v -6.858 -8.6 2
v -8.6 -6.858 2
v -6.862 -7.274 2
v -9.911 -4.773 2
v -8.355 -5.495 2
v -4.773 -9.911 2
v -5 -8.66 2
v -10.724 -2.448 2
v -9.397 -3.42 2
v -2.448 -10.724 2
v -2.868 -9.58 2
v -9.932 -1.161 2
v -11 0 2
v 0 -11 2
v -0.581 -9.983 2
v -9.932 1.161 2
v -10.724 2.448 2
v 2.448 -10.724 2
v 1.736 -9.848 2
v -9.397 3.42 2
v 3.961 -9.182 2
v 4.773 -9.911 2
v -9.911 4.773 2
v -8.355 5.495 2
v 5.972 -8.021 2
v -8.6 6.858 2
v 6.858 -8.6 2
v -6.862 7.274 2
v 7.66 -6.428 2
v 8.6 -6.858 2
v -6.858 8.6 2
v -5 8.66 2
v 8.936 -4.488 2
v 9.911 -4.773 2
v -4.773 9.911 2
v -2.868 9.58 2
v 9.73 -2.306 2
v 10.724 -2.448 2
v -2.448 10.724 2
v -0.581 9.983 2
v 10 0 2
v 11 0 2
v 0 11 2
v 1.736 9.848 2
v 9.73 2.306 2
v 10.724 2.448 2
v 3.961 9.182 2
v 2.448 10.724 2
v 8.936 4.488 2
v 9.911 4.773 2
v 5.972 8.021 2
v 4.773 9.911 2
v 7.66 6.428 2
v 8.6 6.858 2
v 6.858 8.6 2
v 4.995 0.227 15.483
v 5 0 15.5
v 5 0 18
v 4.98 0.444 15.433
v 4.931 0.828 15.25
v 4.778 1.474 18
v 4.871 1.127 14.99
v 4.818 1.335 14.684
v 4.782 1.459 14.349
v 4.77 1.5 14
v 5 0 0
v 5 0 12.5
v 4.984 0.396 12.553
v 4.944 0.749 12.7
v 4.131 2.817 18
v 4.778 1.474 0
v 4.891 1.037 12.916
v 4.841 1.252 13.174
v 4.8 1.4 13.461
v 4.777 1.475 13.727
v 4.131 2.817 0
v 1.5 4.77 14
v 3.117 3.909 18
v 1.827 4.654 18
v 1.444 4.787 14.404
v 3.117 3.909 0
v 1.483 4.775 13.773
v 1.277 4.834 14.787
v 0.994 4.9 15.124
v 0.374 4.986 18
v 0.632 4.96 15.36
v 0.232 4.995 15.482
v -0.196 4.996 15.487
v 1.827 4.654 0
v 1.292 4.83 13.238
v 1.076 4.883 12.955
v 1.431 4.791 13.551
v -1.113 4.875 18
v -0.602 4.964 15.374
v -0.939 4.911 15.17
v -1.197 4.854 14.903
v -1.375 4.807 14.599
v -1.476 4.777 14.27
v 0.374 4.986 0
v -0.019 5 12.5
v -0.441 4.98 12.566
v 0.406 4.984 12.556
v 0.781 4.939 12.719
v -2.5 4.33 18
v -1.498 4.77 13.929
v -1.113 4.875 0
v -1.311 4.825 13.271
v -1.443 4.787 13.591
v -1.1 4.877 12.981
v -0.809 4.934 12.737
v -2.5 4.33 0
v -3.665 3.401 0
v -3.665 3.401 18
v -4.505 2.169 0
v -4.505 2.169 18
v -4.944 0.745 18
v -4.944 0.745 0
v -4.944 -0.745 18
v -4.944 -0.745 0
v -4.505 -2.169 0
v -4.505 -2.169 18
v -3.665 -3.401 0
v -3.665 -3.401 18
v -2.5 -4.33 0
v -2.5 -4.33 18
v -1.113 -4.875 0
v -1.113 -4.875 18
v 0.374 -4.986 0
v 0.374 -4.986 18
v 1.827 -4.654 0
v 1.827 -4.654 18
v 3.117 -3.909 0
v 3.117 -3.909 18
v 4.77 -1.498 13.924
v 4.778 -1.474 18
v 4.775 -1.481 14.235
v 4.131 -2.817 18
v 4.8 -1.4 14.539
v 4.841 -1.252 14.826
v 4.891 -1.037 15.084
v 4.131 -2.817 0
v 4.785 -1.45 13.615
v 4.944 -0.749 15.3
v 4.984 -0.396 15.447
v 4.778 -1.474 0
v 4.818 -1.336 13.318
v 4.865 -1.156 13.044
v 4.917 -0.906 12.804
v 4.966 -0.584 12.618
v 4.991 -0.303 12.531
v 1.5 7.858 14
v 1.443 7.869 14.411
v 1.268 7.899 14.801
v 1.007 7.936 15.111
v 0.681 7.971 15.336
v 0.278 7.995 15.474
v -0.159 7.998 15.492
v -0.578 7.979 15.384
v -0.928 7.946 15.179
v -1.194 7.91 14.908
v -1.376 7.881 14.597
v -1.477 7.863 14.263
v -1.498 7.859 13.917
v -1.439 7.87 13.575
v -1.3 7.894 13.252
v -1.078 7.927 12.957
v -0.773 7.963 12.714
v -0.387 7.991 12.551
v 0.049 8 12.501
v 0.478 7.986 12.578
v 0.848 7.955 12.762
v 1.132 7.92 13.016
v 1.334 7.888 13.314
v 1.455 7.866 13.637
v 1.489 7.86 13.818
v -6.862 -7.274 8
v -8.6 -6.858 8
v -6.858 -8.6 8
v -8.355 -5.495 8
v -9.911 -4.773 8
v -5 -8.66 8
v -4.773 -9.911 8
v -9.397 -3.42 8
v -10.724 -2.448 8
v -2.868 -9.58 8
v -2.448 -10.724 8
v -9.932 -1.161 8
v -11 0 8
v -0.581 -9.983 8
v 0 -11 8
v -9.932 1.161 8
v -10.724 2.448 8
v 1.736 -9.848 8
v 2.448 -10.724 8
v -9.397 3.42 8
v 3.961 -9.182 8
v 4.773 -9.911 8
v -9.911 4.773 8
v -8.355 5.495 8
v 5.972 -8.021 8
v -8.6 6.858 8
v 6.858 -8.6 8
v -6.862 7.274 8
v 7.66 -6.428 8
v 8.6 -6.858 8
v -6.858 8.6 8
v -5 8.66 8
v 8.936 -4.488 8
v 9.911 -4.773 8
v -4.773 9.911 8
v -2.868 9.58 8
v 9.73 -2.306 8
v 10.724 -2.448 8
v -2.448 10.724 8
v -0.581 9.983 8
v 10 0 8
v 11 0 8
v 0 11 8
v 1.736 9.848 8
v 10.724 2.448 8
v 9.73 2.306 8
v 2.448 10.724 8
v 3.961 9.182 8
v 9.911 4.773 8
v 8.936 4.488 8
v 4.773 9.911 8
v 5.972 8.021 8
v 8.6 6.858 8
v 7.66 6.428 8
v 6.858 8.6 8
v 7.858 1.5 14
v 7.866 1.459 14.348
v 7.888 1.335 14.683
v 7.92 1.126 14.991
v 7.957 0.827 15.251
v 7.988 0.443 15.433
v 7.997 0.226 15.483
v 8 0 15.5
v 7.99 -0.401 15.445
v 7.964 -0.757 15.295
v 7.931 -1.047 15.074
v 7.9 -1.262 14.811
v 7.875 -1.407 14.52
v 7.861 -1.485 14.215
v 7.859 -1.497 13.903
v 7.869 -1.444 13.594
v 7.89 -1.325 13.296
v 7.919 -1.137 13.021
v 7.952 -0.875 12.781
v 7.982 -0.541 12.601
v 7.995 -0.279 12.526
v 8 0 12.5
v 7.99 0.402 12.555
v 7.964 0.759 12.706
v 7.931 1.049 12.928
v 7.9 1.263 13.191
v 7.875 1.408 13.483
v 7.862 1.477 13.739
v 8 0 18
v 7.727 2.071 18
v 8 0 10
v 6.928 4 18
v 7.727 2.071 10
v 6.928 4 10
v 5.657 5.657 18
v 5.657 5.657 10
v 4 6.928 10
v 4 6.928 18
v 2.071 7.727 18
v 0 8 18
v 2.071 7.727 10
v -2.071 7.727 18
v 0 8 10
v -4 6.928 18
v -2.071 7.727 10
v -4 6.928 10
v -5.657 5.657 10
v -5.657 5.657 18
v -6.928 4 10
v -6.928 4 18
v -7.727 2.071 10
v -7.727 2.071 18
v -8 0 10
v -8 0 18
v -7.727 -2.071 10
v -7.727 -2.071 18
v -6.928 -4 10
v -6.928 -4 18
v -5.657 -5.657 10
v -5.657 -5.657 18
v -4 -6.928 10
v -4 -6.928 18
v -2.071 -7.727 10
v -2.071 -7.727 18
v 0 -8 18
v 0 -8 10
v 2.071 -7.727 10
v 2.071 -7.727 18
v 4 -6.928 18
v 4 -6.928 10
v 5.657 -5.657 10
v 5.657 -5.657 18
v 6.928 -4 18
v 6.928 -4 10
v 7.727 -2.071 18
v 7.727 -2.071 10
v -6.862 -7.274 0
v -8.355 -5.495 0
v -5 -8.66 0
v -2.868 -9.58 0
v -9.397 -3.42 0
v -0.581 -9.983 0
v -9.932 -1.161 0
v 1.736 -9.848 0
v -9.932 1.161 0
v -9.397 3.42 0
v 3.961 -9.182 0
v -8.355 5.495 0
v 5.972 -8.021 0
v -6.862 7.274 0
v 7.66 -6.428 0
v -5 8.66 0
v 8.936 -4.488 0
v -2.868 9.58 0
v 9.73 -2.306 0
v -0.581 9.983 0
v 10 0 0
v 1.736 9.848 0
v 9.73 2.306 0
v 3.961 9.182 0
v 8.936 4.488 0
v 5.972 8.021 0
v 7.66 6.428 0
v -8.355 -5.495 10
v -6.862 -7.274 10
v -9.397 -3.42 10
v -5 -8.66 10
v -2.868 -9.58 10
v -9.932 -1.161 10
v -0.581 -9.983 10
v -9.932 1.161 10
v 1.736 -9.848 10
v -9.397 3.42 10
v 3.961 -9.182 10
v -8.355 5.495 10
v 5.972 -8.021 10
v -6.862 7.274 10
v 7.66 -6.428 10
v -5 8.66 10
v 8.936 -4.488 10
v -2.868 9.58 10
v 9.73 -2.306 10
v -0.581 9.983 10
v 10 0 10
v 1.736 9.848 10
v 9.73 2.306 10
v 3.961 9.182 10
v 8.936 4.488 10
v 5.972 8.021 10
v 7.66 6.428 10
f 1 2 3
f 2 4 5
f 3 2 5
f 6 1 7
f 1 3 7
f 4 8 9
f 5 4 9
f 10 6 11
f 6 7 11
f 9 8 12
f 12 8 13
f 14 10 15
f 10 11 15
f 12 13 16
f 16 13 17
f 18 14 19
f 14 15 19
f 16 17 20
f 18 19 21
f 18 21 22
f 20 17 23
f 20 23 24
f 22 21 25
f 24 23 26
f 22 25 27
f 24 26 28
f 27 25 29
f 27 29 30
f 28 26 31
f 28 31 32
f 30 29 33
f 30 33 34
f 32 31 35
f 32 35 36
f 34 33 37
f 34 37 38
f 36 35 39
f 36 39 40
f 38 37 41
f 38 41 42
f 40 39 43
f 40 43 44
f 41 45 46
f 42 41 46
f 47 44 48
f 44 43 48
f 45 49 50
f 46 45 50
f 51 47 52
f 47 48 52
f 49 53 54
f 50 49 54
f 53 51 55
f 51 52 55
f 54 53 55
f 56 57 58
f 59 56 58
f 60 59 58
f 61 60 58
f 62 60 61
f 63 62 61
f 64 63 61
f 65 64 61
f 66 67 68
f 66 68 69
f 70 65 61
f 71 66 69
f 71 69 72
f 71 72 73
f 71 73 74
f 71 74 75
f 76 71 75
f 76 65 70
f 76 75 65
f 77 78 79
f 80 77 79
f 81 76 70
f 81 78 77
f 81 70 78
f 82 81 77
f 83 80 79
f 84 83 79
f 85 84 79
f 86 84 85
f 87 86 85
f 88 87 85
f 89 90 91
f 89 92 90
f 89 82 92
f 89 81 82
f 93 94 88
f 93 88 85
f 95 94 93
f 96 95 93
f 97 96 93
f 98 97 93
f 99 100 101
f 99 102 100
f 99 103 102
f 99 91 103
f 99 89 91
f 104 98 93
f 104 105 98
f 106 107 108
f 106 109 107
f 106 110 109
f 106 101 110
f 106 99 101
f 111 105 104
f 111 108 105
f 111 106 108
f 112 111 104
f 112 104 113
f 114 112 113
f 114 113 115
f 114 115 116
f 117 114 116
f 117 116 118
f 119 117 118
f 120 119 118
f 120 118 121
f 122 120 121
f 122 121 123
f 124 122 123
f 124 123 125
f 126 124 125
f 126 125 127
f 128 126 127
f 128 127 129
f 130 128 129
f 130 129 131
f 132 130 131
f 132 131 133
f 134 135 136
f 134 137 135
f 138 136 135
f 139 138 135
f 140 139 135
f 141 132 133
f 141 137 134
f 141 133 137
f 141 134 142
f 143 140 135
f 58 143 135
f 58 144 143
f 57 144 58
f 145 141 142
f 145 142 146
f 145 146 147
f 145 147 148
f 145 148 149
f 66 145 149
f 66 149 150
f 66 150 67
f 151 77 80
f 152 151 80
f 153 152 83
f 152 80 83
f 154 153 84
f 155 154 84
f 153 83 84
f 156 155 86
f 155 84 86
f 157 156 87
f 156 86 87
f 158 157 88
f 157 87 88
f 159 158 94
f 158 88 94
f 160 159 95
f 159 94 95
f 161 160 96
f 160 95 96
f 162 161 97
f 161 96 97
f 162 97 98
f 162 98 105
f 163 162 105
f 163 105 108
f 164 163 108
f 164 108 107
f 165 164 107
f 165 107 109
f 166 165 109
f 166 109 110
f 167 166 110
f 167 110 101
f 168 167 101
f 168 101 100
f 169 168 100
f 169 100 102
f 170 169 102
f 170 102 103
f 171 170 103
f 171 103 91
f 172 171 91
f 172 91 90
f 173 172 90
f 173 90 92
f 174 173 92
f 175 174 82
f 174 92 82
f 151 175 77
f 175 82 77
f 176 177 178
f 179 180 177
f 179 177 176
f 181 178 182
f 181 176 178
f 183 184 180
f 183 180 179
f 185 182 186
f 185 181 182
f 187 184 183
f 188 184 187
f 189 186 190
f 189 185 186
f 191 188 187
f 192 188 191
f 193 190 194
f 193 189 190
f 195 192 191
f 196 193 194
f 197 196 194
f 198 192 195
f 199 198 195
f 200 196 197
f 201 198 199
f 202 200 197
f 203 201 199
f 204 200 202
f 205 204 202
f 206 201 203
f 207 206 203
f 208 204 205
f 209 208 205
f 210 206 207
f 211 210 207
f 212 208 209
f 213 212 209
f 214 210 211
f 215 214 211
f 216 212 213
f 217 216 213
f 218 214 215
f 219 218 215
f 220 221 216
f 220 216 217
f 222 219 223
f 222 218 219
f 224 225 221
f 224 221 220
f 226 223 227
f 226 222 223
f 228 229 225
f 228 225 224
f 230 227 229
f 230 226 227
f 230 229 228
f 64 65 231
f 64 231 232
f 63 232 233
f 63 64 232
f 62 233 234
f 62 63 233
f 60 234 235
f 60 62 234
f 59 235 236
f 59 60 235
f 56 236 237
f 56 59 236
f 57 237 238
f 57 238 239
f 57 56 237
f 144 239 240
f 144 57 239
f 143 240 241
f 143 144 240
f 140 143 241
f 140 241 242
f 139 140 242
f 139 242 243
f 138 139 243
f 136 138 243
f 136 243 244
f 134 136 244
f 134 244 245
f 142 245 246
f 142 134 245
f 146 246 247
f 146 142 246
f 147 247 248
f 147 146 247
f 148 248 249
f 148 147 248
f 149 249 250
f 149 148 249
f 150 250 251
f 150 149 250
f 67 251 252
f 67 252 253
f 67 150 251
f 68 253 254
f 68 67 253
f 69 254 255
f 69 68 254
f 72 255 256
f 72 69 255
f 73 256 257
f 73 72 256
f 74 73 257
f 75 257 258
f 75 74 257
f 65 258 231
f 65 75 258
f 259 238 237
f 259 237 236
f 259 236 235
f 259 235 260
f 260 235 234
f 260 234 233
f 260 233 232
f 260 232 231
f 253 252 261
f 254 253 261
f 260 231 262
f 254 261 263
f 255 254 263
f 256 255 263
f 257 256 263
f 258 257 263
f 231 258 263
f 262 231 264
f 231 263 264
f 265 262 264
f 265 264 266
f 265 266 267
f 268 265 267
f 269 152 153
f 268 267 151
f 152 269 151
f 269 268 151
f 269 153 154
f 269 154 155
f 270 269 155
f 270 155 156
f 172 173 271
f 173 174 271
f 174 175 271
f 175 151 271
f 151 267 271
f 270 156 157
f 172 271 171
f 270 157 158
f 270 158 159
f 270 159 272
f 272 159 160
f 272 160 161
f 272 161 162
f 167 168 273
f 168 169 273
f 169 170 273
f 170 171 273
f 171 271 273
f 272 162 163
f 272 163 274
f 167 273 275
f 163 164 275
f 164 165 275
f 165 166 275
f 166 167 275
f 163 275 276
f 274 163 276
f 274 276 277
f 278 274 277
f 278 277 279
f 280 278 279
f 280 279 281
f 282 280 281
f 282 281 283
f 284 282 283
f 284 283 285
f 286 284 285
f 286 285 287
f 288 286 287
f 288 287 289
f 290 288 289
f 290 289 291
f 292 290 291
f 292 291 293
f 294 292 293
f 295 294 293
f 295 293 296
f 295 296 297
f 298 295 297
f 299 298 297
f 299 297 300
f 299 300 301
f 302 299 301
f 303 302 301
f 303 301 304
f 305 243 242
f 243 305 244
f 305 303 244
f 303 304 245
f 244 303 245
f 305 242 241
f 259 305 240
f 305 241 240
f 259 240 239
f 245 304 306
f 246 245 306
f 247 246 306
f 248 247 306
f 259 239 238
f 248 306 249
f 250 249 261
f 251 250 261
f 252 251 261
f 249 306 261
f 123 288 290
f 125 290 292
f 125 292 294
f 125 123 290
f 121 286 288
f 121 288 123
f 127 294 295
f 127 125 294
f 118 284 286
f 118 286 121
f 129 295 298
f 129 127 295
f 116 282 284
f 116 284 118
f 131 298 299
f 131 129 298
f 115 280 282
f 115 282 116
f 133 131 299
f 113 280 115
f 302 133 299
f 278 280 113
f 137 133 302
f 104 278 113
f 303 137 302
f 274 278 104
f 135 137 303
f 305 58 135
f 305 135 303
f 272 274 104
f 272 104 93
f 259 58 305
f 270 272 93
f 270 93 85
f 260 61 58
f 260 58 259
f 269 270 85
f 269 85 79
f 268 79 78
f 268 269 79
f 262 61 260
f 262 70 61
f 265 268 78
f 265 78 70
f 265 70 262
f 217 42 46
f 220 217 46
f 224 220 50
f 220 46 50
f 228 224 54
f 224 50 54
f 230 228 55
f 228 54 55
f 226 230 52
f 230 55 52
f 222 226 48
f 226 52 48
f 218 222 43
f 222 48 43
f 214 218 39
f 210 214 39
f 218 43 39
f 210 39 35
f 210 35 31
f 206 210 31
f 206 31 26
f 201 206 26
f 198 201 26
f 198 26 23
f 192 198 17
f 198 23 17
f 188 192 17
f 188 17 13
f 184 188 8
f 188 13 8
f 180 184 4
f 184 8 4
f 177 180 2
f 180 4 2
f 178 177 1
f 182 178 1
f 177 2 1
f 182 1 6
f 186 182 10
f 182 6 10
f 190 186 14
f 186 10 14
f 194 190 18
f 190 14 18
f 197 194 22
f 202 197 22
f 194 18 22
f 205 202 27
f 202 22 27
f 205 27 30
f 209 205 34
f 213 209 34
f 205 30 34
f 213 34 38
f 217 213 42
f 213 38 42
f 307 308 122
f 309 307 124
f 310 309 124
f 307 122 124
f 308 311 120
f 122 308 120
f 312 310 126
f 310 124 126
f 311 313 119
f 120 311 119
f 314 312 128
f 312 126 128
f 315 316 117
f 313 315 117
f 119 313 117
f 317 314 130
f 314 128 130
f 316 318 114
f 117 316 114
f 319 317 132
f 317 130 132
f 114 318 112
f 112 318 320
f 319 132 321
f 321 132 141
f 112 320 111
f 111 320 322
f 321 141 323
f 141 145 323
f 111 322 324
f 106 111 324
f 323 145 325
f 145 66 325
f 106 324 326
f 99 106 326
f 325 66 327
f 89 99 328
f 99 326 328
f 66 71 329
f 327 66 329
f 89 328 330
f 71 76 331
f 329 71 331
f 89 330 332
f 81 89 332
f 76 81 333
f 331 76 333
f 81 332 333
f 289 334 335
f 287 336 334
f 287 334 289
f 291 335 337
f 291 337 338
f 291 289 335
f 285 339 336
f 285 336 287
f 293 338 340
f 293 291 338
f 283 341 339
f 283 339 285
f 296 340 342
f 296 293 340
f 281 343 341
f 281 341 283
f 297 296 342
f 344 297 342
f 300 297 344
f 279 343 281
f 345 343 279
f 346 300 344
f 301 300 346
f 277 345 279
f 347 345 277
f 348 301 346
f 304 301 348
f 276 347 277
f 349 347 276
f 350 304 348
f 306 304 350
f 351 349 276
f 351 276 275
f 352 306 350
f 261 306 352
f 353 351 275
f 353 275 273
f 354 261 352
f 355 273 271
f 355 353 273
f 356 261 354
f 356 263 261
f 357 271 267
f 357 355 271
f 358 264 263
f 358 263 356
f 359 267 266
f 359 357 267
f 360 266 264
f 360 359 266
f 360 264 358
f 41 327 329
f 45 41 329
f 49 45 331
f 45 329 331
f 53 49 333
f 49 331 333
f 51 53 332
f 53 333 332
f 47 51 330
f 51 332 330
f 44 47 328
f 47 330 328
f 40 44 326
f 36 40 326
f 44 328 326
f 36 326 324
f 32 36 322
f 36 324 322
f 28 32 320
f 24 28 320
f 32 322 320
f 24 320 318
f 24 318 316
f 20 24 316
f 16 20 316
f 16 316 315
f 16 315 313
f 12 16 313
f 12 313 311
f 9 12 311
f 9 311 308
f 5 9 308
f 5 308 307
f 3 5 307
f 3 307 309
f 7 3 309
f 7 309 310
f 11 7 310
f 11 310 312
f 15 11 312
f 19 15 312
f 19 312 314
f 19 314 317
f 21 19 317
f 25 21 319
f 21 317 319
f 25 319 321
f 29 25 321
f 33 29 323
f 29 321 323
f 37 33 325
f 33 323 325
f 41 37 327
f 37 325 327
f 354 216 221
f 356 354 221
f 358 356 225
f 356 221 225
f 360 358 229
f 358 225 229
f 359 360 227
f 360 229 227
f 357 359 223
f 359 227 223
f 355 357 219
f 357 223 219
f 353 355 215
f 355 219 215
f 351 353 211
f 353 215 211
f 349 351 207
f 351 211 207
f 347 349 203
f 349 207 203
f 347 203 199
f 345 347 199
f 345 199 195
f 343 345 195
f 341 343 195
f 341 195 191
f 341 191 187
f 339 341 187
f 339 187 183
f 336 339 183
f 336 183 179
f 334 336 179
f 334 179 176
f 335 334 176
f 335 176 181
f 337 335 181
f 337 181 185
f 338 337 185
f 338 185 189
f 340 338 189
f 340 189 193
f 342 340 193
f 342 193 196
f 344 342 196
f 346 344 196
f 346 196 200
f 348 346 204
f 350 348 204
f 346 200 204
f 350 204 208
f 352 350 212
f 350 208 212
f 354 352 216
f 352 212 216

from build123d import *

# Parameters (mm, degrees)
F0_R     = 8
F0_R_2   = 5
F2_DEPTH = 18
F0_R_3   = 10
F3_DEPTH = 10
F4_START = 2
F0_R_4   = 11
F4_DEPTH = 6
F1_R     = 1.5
F5_DEPTH = 11.001
F6_R     = 1.5
F7_DEPTH = 11.001


with BuildPart() as f2:
    # F0 (on Top) → F2 (new body)
    with BuildSketch(Plane.XY):
        Circle(F0_R)
        Circle(F0_R_2, mode=Mode.SUBTRACT)
    extrude(amount=F2_DEPTH)

    # F0 (on Top) → F3 (join)
    with BuildSketch(Plane.XY):
        Circle(F0_R_3)
        Circle(F0_R, mode=Mode.SUBTRACT)
    extrude(amount=F3_DEPTH)

    # F0 (on Top) → F4 (join)
    with BuildSketch(Plane.XY.offset(F4_START)):
        Circle(F0_R_4)
        Circle(F0_R_3, mode=Mode.SUBTRACT)
    extrude(amount=F4_DEPTH)

    # F1 (on Right) → F5 (cut, through all)
    with BuildSketch(Plane.YZ):
        with Locations((0, 14)):
            Circle(F1_R)
    extrude(amount=F5_DEPTH, mode=Mode.SUBTRACT)

    # F6 (on Front) → F7 (cut, through all)
    with BuildSketch(Plane.XZ):
        with Locations((0, 14)):
            Circle(F6_R)
    extrude(amount=-F7_DEPTH, mode=Mode.SUBTRACT)


solid = f2.part
